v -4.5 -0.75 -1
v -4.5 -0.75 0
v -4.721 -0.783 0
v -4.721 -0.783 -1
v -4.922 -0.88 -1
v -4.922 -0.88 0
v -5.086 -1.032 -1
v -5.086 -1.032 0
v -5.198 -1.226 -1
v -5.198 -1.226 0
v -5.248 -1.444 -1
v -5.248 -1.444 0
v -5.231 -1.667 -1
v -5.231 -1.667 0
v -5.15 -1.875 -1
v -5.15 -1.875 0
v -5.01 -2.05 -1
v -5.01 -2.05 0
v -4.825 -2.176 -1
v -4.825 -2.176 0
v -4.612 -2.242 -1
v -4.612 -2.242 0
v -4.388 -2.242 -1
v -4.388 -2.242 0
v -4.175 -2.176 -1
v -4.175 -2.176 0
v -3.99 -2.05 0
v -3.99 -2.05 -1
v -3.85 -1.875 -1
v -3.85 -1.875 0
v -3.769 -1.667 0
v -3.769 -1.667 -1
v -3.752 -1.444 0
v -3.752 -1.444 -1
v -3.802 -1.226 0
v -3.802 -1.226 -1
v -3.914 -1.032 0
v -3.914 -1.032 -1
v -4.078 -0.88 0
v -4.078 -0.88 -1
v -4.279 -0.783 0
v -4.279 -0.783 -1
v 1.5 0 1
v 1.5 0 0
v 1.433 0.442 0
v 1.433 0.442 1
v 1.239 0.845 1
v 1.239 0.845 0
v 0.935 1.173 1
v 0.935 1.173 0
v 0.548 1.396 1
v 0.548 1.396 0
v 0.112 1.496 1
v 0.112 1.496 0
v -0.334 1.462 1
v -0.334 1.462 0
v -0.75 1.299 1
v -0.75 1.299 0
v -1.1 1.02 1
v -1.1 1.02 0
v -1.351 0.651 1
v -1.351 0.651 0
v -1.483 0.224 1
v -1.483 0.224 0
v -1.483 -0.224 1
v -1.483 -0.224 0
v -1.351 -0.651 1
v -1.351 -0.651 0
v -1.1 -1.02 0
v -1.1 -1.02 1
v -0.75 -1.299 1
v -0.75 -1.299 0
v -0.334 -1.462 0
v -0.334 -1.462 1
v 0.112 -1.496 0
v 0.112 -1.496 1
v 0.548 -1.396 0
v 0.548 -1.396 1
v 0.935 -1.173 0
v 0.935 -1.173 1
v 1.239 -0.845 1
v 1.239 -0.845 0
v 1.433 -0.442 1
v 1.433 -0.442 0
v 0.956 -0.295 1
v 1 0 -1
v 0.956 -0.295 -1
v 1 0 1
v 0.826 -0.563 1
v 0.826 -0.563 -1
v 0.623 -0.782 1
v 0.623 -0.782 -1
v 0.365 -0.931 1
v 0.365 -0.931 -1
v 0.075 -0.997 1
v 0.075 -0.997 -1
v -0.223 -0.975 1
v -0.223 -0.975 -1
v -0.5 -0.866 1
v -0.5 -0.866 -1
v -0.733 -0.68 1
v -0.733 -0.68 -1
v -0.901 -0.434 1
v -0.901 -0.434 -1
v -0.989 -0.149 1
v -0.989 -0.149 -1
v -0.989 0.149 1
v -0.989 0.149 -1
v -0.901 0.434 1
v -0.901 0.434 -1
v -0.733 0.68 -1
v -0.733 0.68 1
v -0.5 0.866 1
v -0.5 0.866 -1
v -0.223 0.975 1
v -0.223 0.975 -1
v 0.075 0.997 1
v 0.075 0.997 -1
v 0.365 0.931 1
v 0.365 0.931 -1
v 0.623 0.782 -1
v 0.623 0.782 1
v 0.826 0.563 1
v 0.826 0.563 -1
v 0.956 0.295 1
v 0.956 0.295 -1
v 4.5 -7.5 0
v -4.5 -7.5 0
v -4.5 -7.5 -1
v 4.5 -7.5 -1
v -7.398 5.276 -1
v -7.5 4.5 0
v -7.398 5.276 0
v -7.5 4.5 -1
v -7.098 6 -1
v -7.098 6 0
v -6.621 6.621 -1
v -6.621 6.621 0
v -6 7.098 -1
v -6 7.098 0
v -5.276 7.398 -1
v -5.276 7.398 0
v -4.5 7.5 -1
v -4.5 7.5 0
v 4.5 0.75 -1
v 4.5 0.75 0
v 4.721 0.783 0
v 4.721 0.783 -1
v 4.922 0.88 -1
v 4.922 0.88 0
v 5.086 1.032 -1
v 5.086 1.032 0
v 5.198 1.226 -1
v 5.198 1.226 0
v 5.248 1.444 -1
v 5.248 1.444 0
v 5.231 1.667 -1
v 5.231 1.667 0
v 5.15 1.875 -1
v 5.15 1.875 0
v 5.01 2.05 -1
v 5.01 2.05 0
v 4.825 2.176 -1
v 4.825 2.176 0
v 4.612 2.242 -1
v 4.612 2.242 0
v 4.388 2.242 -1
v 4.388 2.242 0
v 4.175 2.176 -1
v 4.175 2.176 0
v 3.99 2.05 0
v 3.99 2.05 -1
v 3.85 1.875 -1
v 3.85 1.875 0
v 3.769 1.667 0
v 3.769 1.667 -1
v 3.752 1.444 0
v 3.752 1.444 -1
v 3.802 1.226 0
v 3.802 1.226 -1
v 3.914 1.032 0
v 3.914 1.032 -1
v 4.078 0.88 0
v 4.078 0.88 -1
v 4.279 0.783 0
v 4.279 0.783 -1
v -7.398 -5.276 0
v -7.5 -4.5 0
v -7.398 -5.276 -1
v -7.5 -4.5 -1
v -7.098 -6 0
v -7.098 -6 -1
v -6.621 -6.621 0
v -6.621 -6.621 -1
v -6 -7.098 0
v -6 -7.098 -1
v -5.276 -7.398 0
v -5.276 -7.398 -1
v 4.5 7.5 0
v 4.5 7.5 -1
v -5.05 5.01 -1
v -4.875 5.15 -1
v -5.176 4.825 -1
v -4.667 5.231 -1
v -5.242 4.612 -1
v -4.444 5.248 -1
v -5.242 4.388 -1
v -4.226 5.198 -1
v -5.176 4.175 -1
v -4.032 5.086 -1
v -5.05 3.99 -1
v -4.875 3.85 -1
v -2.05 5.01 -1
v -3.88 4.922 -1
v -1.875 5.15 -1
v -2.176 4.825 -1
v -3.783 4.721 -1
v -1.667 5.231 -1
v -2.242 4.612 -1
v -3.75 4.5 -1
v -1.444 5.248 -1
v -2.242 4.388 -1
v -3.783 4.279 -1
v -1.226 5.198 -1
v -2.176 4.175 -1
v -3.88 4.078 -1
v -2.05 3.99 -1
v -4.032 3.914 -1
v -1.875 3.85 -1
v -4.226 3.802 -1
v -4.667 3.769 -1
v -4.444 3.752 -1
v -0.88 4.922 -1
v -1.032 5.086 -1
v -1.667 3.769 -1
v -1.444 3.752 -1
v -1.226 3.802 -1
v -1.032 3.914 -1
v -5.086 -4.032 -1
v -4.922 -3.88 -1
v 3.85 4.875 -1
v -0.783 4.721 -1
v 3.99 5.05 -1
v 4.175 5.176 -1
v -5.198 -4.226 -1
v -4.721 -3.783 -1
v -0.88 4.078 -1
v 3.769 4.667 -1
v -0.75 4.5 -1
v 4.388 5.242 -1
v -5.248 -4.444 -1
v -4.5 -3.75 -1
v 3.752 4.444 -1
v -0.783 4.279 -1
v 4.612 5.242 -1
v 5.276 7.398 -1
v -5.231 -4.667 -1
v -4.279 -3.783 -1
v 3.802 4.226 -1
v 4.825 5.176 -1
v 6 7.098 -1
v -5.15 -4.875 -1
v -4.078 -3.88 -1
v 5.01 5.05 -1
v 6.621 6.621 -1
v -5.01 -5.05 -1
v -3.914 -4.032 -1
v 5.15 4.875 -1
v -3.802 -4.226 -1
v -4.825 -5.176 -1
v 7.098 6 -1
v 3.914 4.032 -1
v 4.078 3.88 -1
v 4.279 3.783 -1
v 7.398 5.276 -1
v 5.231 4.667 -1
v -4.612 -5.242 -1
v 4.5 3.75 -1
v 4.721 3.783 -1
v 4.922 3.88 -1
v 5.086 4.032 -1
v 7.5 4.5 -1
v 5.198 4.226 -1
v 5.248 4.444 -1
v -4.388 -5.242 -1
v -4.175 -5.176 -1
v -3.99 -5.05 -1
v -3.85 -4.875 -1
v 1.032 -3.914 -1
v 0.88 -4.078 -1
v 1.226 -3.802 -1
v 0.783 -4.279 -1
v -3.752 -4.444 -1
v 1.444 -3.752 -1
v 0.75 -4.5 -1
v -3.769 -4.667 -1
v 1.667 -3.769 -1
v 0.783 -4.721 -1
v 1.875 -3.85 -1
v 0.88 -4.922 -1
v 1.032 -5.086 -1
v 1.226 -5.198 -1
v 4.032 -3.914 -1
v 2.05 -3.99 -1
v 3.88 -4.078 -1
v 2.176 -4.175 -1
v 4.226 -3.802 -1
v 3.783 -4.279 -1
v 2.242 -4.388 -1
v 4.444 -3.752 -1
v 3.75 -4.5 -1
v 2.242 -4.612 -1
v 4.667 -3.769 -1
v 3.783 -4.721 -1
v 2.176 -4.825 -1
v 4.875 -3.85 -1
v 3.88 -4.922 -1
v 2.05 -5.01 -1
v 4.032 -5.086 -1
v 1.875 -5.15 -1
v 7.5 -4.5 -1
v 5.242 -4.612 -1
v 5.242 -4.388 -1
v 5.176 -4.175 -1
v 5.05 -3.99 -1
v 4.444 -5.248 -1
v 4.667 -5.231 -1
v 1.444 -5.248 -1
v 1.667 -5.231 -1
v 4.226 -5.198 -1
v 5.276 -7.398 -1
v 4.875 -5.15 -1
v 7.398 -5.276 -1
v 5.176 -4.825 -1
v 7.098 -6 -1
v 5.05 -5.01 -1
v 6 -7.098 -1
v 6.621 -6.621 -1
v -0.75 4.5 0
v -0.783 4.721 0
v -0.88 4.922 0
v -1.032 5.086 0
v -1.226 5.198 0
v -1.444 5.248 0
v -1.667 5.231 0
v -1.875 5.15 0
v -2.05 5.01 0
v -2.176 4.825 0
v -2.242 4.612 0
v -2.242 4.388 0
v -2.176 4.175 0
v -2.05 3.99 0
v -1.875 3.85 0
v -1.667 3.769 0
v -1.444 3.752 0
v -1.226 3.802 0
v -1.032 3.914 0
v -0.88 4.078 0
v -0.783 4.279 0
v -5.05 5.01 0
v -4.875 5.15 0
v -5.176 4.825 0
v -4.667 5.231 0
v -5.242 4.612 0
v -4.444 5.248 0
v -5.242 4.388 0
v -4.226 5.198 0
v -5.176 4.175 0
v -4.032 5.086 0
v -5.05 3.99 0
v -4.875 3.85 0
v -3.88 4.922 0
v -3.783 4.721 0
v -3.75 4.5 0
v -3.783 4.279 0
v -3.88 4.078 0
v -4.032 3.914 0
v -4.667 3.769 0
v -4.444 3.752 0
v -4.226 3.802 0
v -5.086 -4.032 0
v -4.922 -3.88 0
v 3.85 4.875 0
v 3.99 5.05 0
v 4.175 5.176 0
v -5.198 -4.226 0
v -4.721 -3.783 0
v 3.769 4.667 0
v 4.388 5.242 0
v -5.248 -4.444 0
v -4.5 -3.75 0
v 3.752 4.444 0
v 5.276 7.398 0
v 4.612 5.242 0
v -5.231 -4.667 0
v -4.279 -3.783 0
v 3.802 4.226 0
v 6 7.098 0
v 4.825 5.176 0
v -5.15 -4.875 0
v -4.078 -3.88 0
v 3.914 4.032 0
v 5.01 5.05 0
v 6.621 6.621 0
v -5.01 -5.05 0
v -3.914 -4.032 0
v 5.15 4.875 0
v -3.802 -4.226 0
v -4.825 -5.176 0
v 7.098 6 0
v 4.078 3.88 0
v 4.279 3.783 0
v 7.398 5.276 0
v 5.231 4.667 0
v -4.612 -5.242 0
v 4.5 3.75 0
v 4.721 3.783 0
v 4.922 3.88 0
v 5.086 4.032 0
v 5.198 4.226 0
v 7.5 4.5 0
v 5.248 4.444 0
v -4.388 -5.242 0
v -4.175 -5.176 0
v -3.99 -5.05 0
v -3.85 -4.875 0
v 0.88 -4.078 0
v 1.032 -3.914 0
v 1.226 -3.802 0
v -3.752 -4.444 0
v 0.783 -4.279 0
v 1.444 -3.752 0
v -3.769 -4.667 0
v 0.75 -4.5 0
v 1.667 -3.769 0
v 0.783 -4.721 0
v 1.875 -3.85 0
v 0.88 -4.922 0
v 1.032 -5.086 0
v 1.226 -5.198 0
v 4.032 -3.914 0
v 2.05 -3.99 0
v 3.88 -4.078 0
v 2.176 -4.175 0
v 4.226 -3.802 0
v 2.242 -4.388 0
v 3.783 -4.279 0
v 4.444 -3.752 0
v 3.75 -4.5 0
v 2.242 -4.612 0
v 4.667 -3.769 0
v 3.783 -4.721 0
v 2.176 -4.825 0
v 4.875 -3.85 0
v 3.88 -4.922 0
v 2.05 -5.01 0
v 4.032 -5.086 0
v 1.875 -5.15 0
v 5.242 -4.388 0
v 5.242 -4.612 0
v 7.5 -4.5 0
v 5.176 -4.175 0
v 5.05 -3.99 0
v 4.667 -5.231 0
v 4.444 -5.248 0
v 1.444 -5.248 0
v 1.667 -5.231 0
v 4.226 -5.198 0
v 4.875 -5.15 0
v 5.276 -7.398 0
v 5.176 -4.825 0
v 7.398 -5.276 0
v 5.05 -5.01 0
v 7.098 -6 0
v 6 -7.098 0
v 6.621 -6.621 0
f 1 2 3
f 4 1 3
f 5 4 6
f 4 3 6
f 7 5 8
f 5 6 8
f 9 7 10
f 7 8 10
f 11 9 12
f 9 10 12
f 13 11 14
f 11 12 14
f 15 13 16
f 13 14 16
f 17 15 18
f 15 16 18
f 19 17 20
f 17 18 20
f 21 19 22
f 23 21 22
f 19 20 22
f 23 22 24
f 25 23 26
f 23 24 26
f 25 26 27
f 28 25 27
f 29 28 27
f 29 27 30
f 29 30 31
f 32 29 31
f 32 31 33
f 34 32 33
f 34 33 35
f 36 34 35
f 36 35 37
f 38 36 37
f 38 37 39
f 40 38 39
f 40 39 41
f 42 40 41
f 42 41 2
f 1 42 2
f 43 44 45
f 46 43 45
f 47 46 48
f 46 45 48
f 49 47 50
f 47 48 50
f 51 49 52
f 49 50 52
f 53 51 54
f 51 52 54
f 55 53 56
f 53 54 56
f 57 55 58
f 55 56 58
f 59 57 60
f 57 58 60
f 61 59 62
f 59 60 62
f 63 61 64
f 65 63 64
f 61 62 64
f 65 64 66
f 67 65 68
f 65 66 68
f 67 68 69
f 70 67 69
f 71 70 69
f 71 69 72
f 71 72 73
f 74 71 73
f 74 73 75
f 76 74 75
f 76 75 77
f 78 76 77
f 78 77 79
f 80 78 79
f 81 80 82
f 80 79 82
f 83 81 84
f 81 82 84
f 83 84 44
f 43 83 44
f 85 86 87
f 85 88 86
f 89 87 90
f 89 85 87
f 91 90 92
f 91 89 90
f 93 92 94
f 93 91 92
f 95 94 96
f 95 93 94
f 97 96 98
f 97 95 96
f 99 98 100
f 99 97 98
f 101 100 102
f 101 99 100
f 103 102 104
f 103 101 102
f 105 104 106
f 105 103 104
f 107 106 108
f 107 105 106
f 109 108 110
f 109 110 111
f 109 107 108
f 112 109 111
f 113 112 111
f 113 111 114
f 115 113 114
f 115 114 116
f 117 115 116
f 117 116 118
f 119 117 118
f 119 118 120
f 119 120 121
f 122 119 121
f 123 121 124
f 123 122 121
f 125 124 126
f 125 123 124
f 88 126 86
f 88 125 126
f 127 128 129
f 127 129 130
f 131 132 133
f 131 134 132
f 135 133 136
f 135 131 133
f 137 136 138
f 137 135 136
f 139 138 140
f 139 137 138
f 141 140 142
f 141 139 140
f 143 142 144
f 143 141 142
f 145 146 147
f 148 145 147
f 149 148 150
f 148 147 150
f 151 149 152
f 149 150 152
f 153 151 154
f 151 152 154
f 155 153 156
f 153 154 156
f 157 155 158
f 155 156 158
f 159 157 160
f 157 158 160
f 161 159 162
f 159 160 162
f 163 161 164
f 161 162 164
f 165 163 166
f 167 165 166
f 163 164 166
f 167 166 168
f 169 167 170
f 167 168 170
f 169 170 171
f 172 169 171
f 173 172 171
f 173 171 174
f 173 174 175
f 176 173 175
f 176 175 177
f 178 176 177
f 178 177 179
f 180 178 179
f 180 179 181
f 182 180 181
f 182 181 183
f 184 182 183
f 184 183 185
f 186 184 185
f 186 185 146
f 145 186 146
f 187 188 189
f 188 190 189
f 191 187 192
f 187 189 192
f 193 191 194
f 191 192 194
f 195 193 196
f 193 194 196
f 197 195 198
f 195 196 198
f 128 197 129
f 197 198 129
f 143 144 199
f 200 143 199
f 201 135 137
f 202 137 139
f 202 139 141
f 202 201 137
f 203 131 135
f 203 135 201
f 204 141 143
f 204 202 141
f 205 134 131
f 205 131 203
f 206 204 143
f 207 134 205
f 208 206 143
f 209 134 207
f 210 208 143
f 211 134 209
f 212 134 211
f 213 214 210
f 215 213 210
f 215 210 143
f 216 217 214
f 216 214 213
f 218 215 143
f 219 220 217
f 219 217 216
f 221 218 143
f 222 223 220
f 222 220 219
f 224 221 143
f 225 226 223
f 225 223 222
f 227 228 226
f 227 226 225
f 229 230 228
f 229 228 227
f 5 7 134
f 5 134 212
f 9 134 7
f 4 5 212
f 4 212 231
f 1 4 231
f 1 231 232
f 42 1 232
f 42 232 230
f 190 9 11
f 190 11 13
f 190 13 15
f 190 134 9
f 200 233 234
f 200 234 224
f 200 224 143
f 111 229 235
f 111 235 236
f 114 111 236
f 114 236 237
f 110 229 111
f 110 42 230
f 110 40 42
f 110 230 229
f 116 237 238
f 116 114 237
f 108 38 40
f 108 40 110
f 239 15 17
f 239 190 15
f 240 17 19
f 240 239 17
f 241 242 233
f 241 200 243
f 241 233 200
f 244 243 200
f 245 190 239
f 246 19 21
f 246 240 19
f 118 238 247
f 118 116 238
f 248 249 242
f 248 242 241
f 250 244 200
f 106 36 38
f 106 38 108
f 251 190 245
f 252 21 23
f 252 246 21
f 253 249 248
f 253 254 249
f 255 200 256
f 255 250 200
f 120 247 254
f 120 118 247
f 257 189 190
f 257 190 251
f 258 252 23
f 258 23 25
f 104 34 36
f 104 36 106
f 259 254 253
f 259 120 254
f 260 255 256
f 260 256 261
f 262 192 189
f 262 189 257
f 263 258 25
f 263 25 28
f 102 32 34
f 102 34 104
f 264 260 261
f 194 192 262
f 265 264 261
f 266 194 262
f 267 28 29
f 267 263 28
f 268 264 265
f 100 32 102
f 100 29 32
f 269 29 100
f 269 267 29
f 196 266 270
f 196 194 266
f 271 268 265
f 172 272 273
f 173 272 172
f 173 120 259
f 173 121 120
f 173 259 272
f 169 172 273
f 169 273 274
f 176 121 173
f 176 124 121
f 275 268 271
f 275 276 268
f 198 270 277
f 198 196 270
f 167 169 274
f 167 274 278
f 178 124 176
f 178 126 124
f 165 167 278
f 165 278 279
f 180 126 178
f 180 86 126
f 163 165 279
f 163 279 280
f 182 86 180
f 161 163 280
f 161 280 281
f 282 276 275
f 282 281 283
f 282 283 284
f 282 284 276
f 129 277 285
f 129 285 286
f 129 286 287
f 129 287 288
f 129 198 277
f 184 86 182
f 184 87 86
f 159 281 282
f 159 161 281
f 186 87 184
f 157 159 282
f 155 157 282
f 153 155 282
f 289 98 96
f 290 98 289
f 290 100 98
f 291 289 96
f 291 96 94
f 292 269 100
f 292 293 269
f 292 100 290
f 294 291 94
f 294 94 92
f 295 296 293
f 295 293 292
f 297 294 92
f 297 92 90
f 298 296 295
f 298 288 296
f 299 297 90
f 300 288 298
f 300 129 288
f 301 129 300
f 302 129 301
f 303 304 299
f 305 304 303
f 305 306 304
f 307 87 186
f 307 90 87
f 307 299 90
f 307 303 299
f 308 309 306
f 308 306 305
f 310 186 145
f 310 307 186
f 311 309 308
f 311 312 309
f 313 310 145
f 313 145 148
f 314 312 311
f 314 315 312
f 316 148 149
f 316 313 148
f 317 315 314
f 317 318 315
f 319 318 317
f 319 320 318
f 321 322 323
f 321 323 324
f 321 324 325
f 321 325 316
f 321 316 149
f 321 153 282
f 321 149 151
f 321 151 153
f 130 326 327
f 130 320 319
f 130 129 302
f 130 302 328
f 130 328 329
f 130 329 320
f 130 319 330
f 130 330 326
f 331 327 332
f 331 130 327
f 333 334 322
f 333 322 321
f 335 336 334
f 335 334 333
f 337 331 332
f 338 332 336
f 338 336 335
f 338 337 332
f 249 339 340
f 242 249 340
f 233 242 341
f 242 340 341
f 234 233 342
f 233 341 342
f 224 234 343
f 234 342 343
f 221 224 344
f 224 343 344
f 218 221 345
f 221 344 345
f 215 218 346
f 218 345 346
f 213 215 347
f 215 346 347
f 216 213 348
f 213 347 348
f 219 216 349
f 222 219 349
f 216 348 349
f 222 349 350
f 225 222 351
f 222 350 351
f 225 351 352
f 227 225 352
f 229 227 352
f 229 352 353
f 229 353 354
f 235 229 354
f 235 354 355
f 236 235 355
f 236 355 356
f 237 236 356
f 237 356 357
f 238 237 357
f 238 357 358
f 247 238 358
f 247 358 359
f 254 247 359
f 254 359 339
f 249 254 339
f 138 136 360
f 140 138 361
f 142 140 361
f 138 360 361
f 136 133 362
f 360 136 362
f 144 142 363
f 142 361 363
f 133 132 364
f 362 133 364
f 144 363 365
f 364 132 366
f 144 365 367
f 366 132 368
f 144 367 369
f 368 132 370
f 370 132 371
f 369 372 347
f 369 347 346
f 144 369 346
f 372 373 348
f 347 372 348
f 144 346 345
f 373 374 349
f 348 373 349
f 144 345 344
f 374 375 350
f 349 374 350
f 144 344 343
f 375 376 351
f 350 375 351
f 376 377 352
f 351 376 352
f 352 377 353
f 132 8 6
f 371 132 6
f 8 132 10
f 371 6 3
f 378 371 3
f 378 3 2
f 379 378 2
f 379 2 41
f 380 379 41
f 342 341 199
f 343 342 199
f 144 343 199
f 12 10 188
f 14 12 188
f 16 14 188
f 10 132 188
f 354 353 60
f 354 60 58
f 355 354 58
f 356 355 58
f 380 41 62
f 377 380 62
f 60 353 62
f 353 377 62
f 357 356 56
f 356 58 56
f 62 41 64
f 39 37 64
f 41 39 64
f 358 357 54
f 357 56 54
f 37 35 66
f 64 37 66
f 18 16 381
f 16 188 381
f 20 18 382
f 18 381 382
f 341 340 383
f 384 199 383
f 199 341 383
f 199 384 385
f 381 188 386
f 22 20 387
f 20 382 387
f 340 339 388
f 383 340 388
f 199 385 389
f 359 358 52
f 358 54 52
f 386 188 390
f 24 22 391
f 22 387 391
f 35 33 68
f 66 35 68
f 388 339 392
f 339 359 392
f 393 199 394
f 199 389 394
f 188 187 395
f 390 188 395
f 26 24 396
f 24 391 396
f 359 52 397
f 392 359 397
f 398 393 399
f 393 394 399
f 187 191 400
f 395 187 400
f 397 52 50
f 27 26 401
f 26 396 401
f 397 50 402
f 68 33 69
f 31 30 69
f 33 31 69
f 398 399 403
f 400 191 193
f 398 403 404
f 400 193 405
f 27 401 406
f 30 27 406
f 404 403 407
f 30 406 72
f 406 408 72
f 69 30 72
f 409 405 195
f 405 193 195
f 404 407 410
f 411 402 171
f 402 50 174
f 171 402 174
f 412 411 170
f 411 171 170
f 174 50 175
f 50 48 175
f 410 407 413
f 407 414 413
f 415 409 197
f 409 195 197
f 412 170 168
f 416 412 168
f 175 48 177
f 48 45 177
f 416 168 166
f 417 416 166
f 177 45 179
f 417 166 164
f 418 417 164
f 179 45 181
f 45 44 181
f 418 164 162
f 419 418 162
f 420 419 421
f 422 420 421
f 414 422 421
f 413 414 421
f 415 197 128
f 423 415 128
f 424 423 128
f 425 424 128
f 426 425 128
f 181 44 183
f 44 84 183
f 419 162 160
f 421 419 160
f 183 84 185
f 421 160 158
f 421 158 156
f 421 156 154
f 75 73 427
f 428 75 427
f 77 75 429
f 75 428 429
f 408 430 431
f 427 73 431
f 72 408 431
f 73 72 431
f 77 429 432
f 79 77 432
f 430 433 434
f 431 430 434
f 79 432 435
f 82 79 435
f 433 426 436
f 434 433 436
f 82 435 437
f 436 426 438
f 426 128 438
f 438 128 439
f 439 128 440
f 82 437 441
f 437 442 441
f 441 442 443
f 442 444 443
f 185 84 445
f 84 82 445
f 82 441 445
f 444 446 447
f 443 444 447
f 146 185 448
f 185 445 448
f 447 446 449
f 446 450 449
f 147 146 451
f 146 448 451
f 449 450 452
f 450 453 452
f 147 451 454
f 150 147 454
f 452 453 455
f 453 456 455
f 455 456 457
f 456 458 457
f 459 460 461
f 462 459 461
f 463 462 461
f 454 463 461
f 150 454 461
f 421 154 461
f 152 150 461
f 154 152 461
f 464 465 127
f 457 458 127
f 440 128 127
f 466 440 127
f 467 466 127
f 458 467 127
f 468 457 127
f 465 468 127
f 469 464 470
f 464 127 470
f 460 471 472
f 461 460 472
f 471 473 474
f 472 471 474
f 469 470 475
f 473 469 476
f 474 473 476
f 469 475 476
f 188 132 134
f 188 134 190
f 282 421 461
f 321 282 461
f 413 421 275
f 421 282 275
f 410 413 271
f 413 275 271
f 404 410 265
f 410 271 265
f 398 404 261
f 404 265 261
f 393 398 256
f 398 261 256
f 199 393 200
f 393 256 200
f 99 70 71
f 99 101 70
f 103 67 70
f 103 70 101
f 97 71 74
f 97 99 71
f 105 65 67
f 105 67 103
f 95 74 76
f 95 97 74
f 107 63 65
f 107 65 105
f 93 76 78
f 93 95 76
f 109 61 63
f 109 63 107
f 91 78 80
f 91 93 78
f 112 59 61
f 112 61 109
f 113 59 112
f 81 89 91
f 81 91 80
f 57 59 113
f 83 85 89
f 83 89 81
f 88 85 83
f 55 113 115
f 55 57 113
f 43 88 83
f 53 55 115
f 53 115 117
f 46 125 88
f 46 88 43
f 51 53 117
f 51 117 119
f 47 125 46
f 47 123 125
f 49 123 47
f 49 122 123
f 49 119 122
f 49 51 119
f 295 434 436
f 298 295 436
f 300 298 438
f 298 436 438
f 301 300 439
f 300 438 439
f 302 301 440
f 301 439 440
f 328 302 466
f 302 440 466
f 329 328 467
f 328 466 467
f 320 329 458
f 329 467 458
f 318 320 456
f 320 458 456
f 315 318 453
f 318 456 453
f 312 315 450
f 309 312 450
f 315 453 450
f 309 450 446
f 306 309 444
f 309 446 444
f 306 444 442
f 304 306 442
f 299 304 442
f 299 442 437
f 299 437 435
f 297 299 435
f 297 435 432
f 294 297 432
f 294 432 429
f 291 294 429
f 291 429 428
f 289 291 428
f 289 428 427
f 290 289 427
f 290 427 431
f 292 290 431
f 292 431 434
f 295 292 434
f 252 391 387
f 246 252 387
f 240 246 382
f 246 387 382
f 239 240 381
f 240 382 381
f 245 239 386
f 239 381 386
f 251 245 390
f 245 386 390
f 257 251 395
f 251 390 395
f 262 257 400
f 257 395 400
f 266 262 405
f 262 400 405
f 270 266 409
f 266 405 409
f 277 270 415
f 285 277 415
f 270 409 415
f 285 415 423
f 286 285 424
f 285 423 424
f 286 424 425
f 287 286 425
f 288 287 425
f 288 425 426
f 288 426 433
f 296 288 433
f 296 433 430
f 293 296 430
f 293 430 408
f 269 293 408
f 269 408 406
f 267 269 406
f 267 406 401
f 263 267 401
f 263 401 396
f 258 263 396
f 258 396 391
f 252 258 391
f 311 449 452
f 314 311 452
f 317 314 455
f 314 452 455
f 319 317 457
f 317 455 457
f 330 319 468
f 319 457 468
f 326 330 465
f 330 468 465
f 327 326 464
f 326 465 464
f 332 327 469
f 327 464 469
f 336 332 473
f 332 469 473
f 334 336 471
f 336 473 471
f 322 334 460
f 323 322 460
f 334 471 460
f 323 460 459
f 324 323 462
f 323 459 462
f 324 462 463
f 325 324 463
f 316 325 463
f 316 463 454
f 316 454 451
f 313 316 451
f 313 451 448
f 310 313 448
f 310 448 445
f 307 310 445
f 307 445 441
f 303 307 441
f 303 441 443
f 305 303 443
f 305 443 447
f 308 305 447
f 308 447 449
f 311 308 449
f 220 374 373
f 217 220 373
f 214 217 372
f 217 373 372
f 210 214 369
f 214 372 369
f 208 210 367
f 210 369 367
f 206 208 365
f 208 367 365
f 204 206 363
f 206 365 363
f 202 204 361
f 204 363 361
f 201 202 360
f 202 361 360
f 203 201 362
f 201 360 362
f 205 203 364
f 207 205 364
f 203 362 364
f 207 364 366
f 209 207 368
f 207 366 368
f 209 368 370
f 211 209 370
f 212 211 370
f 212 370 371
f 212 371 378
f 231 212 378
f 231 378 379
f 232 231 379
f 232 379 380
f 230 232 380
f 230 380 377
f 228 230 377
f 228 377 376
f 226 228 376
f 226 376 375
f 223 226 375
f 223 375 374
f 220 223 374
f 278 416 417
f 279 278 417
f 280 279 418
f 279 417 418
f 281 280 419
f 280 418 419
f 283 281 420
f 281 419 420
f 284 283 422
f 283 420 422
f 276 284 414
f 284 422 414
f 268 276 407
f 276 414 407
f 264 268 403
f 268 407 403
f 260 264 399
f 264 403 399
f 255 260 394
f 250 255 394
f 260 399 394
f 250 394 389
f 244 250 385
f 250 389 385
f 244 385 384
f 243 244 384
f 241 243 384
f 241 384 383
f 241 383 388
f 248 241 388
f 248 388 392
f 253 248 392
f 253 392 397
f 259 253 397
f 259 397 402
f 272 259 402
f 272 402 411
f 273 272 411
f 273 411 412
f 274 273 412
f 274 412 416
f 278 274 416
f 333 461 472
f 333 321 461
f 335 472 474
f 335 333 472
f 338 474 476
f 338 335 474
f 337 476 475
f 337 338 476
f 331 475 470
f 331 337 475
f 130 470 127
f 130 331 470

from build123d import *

# Parameters (mm, degrees)
F0_R            = 1.5
F0_R_2          = 1
F1_DEPTH        = 1
F2_W            = 15
F2_H            = 15
F2_R            = 5
F2_R_2          = 1.5
F2_R_3          = 1
F3_DEPTH        = 1
F4_R            = 3
F5_R            = 0.75
F6_DEPTH        = 25
F6_COPIES_COUNT = 4


# Not quite as in the source:
# - a pattern or mirror of a feature is missing from the dataset's text; its kind, count and spacing are read off the source's solid


with BuildPart() as f1:
    # F0 (on Top) → F1 (new body)
    with BuildSketch(Plane.XY):
        Circle(F0_R)
        Circle(F0_R_2, mode=Mode.SUBTRACT)
    extrude(amount=F1_DEPTH)

    # F2 (on face) → F3 (join)
    with BuildSketch(Plane(origin=(0, 0, 0), x_dir=(1, 0, 0), z_dir=(0, 0, -1))):
        Rectangle(F2_W, F2_H)
        Circle(F2_R, mode=Mode.SUBTRACT)
        Circle(F2_R)
        Circle(F2_R_2, mode=Mode.SUBTRACT)
        Circle(F2_R_2)
        Circle(F2_R_3, mode=Mode.SUBTRACT)
    extrude(amount=F3_DEPTH)

    # F4
    f4_edges = [f1.edges().sort_by_distance(p)[0] for p in [
        (-7.5, 7.5, -0.5),
        (7.5, 7.5, -0.5),
        (-7.5, -7.5, -0.5),
        (7.5, -7.5, -0.5),
    ]]
    fillet(f4_edges, radius=F4_R)

    # F5 (on face) → F6 (cut)
    with BuildSketch(Plane.XY):
        with Locations((-4.5, 4.5)):
            Circle(F5_R)
        with Locations((-1.5, 4.5)):
            Circle(F5_R)
    f6 = extrude(amount=-F6_DEPTH, mode=Mode.SUBTRACT)

    # F6_copies: F6 ×4 about axis
    f6_copies_axis = Axis((0, 0, 0), (0, 0, 1))
    for i in range(1, F6_COPIES_COUNT):
        add(f6.rotate(f6_copies_axis, i * 360 / F6_COPIES_COUNT), mode=Mode.SUBTRACT)


solid = f1.part
